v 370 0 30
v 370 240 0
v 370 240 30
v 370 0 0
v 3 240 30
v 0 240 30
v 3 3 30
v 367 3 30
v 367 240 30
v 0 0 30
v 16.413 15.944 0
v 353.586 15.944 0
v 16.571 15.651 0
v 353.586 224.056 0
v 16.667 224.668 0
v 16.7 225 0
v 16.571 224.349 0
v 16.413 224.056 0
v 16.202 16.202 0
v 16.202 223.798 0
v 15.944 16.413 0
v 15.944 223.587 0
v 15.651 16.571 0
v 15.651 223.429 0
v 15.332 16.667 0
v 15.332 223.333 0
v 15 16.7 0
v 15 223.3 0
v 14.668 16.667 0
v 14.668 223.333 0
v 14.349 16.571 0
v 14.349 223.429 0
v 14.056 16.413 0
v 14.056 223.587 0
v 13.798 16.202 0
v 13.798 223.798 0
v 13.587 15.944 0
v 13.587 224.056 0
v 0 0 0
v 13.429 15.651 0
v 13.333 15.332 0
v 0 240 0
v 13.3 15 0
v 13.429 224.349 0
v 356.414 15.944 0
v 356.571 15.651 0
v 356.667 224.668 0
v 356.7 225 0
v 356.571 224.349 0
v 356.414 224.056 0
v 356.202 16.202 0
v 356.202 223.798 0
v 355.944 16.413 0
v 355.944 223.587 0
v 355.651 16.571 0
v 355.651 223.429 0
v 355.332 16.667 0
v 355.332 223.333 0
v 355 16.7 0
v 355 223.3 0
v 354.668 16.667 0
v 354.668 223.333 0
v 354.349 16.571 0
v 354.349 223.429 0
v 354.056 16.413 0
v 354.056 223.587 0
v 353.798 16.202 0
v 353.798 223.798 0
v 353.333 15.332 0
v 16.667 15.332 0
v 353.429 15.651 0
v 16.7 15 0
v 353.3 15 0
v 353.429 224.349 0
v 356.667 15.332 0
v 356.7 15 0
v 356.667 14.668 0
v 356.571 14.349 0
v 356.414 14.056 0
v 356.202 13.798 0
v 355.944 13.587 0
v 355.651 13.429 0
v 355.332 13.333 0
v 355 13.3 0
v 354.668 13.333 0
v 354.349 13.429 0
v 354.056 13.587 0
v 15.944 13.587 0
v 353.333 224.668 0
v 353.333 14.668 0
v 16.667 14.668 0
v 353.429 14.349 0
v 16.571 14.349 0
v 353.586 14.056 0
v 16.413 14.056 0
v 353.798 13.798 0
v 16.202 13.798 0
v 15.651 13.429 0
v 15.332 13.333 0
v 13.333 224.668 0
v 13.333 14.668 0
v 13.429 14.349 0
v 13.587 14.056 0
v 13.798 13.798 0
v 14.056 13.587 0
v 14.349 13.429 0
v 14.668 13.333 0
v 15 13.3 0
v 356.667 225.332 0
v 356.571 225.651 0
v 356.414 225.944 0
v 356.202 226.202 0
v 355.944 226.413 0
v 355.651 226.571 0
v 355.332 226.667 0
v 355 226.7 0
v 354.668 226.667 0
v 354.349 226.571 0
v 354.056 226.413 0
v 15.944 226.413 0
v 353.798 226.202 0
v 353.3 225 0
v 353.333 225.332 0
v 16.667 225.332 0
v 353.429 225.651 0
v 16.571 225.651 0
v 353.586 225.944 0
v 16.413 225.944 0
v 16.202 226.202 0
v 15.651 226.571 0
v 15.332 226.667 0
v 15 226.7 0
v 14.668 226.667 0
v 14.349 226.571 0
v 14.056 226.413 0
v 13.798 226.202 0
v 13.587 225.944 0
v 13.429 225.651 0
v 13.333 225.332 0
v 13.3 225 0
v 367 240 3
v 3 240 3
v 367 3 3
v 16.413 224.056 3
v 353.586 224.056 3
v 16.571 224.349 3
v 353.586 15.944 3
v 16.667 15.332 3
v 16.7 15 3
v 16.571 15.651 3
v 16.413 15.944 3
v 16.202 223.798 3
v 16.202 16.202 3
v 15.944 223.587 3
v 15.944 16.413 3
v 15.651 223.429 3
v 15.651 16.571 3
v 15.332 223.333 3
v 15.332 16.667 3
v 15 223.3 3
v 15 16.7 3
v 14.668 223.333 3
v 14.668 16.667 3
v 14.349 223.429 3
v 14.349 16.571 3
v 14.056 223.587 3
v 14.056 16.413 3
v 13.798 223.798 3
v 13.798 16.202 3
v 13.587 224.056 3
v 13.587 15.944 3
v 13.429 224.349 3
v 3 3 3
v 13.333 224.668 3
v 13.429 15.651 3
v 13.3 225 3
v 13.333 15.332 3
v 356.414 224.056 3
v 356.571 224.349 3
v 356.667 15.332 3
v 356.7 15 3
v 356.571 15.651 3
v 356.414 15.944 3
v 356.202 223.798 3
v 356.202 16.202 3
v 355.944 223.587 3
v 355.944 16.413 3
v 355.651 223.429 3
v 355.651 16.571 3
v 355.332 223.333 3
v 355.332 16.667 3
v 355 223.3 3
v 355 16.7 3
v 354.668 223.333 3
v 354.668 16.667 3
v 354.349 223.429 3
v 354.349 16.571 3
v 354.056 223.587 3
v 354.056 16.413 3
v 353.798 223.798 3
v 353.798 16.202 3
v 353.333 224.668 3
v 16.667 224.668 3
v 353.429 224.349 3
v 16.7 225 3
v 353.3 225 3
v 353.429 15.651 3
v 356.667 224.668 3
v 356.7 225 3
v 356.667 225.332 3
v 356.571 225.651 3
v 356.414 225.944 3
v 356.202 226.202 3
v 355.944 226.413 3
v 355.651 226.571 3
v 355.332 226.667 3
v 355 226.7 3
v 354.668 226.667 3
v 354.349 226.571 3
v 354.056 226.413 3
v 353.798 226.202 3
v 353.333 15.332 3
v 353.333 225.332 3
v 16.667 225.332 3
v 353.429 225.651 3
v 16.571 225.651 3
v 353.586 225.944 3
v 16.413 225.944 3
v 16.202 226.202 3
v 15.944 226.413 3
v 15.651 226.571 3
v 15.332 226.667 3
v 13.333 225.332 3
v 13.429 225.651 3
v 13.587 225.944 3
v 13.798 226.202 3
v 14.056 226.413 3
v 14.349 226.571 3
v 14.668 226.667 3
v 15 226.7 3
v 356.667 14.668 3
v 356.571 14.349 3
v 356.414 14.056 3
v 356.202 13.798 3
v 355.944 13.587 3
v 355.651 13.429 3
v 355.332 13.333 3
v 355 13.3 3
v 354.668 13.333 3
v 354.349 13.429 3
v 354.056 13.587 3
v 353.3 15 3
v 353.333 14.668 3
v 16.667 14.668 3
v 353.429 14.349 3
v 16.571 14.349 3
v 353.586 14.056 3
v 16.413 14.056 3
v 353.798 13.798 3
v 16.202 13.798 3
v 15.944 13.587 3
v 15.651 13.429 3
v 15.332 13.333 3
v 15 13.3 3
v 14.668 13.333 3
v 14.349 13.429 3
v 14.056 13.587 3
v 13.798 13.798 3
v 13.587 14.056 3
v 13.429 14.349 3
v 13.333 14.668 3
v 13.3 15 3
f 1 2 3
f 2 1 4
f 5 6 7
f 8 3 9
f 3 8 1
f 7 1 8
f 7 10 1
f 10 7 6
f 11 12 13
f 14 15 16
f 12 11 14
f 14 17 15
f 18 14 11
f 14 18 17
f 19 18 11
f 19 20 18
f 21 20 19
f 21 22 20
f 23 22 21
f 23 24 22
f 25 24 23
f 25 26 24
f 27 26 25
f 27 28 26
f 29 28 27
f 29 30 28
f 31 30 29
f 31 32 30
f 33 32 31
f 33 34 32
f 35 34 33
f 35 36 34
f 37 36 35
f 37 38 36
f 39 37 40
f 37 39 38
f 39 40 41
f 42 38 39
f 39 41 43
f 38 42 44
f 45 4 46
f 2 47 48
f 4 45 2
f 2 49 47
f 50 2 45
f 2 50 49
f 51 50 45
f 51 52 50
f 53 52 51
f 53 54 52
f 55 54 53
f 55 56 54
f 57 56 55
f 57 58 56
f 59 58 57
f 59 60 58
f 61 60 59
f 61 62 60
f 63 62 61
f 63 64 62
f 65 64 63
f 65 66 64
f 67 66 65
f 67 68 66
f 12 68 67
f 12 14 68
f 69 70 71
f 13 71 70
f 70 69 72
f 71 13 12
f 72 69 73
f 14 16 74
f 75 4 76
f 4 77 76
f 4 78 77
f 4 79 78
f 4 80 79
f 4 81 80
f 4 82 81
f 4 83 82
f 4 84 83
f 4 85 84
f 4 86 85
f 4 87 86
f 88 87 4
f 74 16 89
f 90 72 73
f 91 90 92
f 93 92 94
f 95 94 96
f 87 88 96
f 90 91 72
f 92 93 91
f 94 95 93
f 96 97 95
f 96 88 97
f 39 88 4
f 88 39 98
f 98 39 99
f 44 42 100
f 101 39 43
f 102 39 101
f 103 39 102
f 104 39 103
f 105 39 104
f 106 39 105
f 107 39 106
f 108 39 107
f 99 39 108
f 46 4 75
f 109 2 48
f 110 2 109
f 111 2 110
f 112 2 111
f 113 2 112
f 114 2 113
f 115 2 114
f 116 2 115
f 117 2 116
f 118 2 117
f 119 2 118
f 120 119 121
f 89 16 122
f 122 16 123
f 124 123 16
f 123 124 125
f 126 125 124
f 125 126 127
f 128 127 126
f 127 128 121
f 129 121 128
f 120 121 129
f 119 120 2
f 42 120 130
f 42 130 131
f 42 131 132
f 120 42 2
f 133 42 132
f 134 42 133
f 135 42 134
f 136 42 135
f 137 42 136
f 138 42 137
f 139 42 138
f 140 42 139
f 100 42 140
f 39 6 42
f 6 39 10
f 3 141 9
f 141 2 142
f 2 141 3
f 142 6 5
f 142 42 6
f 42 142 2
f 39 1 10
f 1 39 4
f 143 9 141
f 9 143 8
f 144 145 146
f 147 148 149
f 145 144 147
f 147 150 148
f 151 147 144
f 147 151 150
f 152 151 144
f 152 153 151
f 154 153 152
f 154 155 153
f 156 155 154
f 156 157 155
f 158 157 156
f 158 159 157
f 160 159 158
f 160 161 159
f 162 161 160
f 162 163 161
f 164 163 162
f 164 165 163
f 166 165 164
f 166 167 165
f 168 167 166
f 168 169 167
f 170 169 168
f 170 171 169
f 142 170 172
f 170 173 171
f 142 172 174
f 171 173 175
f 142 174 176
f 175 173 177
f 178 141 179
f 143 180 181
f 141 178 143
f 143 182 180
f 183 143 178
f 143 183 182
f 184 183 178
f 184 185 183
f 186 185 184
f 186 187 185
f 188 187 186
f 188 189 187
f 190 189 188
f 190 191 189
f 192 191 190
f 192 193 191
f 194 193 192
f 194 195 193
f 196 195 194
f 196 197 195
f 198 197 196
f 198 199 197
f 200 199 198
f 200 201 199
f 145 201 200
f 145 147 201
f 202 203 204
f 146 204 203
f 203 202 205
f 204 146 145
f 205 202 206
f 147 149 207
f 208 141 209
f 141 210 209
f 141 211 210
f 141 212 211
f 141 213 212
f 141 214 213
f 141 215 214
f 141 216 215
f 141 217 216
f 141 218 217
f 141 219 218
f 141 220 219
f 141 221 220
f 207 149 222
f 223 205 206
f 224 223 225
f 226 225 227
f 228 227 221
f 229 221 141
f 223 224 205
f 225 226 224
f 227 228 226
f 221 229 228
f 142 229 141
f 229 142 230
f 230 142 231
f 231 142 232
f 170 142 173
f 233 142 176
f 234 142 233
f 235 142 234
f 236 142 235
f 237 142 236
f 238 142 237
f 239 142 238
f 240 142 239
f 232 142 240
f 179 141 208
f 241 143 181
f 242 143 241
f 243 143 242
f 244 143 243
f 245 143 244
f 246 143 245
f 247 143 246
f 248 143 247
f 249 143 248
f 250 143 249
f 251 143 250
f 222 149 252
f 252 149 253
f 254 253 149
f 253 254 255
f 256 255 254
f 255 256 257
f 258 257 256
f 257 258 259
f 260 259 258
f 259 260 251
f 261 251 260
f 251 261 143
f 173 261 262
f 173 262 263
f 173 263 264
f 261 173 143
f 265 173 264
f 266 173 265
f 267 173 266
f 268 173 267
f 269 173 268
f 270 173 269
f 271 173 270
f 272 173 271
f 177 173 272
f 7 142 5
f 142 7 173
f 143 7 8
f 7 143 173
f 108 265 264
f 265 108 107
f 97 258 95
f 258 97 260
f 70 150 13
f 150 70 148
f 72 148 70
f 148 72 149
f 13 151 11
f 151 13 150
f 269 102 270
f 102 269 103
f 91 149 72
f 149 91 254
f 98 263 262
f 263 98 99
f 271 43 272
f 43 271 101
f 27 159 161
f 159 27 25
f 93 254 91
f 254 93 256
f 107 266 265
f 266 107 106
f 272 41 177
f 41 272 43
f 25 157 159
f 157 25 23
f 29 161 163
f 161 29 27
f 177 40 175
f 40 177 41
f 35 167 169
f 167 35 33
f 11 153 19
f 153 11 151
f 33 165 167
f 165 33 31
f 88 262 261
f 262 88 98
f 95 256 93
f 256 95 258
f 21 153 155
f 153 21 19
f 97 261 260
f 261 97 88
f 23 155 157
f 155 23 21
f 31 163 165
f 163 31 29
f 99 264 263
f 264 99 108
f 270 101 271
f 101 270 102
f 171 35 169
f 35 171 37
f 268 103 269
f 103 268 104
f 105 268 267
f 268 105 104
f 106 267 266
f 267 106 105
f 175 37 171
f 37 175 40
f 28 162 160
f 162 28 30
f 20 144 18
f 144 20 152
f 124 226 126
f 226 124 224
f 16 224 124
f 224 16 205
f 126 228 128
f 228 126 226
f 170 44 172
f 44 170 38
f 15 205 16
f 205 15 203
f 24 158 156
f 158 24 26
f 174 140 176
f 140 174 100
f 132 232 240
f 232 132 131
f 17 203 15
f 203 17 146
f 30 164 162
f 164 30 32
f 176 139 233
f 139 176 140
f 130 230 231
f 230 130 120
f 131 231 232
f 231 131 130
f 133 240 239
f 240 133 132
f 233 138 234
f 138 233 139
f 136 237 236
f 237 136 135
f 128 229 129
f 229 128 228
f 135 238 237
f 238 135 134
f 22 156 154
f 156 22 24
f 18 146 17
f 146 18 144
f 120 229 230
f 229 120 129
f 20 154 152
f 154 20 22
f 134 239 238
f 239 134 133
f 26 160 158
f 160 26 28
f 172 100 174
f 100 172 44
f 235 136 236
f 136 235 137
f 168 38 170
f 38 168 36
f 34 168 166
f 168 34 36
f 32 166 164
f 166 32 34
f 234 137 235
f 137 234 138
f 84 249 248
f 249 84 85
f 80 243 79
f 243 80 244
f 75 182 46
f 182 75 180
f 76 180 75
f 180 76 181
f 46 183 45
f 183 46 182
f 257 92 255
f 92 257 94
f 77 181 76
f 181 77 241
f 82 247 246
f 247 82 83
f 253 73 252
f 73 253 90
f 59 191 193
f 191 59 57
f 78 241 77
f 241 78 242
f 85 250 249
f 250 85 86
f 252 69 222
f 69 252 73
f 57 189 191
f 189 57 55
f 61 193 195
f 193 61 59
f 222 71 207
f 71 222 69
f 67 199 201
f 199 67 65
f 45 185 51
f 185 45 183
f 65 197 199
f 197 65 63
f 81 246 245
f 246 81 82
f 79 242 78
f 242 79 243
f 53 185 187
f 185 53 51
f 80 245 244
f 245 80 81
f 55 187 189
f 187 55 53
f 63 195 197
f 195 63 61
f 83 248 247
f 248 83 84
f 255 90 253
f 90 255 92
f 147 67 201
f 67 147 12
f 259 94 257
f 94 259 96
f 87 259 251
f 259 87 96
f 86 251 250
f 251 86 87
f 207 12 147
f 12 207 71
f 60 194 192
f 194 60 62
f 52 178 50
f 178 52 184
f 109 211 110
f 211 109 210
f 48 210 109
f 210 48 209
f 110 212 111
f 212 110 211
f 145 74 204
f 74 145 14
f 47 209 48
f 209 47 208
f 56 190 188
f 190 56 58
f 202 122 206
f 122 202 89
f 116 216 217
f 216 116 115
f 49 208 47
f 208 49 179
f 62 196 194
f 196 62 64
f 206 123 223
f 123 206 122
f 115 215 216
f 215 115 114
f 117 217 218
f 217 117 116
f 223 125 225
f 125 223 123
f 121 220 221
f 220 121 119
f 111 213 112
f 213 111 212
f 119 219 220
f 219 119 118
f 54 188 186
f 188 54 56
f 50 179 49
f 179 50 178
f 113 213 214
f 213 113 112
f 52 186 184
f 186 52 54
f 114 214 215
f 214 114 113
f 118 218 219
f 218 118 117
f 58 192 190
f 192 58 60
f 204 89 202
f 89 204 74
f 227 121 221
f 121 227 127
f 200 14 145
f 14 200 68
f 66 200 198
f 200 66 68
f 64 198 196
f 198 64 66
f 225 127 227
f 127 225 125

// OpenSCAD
// ModuDeck donor chassis study: NOT a verified ThinkPad fit.
// Millimetres. 370x240 is an unconfirmed owner measurement.
$fn=32; W=370; D=240; t=3;
module plate(w,d,h){cube([w,d,h]);}
module shell(w,d,h){difference(){cube([w,d,h]);translate([t,t,t])cube([w-2*t,d-2*t,h]);}}
module hole(x,y,h){translate([x,y,-1])cylinder(d=3.4,h=h+2);}
module rail(n){difference(){cube([n,12,6]);for(x=[10:20:n-10])hole(x,6,6);}}
module rear(){difference(){cube([W-6,3,25]);translate([W/2-23,-1,6])cube([40,5,14]);for(x=[10,W-16])translate([x,-1,12])rotate([-90,0,0])cylinder(d=3.4,h=5);}}
module tray(){difference(){shell(W,D,30);translate([3,D-4,3])cube([W-6,6,27]);for(x=[15,W-15],y=[15,D-15])hole(x,y,30);}}
tray();
